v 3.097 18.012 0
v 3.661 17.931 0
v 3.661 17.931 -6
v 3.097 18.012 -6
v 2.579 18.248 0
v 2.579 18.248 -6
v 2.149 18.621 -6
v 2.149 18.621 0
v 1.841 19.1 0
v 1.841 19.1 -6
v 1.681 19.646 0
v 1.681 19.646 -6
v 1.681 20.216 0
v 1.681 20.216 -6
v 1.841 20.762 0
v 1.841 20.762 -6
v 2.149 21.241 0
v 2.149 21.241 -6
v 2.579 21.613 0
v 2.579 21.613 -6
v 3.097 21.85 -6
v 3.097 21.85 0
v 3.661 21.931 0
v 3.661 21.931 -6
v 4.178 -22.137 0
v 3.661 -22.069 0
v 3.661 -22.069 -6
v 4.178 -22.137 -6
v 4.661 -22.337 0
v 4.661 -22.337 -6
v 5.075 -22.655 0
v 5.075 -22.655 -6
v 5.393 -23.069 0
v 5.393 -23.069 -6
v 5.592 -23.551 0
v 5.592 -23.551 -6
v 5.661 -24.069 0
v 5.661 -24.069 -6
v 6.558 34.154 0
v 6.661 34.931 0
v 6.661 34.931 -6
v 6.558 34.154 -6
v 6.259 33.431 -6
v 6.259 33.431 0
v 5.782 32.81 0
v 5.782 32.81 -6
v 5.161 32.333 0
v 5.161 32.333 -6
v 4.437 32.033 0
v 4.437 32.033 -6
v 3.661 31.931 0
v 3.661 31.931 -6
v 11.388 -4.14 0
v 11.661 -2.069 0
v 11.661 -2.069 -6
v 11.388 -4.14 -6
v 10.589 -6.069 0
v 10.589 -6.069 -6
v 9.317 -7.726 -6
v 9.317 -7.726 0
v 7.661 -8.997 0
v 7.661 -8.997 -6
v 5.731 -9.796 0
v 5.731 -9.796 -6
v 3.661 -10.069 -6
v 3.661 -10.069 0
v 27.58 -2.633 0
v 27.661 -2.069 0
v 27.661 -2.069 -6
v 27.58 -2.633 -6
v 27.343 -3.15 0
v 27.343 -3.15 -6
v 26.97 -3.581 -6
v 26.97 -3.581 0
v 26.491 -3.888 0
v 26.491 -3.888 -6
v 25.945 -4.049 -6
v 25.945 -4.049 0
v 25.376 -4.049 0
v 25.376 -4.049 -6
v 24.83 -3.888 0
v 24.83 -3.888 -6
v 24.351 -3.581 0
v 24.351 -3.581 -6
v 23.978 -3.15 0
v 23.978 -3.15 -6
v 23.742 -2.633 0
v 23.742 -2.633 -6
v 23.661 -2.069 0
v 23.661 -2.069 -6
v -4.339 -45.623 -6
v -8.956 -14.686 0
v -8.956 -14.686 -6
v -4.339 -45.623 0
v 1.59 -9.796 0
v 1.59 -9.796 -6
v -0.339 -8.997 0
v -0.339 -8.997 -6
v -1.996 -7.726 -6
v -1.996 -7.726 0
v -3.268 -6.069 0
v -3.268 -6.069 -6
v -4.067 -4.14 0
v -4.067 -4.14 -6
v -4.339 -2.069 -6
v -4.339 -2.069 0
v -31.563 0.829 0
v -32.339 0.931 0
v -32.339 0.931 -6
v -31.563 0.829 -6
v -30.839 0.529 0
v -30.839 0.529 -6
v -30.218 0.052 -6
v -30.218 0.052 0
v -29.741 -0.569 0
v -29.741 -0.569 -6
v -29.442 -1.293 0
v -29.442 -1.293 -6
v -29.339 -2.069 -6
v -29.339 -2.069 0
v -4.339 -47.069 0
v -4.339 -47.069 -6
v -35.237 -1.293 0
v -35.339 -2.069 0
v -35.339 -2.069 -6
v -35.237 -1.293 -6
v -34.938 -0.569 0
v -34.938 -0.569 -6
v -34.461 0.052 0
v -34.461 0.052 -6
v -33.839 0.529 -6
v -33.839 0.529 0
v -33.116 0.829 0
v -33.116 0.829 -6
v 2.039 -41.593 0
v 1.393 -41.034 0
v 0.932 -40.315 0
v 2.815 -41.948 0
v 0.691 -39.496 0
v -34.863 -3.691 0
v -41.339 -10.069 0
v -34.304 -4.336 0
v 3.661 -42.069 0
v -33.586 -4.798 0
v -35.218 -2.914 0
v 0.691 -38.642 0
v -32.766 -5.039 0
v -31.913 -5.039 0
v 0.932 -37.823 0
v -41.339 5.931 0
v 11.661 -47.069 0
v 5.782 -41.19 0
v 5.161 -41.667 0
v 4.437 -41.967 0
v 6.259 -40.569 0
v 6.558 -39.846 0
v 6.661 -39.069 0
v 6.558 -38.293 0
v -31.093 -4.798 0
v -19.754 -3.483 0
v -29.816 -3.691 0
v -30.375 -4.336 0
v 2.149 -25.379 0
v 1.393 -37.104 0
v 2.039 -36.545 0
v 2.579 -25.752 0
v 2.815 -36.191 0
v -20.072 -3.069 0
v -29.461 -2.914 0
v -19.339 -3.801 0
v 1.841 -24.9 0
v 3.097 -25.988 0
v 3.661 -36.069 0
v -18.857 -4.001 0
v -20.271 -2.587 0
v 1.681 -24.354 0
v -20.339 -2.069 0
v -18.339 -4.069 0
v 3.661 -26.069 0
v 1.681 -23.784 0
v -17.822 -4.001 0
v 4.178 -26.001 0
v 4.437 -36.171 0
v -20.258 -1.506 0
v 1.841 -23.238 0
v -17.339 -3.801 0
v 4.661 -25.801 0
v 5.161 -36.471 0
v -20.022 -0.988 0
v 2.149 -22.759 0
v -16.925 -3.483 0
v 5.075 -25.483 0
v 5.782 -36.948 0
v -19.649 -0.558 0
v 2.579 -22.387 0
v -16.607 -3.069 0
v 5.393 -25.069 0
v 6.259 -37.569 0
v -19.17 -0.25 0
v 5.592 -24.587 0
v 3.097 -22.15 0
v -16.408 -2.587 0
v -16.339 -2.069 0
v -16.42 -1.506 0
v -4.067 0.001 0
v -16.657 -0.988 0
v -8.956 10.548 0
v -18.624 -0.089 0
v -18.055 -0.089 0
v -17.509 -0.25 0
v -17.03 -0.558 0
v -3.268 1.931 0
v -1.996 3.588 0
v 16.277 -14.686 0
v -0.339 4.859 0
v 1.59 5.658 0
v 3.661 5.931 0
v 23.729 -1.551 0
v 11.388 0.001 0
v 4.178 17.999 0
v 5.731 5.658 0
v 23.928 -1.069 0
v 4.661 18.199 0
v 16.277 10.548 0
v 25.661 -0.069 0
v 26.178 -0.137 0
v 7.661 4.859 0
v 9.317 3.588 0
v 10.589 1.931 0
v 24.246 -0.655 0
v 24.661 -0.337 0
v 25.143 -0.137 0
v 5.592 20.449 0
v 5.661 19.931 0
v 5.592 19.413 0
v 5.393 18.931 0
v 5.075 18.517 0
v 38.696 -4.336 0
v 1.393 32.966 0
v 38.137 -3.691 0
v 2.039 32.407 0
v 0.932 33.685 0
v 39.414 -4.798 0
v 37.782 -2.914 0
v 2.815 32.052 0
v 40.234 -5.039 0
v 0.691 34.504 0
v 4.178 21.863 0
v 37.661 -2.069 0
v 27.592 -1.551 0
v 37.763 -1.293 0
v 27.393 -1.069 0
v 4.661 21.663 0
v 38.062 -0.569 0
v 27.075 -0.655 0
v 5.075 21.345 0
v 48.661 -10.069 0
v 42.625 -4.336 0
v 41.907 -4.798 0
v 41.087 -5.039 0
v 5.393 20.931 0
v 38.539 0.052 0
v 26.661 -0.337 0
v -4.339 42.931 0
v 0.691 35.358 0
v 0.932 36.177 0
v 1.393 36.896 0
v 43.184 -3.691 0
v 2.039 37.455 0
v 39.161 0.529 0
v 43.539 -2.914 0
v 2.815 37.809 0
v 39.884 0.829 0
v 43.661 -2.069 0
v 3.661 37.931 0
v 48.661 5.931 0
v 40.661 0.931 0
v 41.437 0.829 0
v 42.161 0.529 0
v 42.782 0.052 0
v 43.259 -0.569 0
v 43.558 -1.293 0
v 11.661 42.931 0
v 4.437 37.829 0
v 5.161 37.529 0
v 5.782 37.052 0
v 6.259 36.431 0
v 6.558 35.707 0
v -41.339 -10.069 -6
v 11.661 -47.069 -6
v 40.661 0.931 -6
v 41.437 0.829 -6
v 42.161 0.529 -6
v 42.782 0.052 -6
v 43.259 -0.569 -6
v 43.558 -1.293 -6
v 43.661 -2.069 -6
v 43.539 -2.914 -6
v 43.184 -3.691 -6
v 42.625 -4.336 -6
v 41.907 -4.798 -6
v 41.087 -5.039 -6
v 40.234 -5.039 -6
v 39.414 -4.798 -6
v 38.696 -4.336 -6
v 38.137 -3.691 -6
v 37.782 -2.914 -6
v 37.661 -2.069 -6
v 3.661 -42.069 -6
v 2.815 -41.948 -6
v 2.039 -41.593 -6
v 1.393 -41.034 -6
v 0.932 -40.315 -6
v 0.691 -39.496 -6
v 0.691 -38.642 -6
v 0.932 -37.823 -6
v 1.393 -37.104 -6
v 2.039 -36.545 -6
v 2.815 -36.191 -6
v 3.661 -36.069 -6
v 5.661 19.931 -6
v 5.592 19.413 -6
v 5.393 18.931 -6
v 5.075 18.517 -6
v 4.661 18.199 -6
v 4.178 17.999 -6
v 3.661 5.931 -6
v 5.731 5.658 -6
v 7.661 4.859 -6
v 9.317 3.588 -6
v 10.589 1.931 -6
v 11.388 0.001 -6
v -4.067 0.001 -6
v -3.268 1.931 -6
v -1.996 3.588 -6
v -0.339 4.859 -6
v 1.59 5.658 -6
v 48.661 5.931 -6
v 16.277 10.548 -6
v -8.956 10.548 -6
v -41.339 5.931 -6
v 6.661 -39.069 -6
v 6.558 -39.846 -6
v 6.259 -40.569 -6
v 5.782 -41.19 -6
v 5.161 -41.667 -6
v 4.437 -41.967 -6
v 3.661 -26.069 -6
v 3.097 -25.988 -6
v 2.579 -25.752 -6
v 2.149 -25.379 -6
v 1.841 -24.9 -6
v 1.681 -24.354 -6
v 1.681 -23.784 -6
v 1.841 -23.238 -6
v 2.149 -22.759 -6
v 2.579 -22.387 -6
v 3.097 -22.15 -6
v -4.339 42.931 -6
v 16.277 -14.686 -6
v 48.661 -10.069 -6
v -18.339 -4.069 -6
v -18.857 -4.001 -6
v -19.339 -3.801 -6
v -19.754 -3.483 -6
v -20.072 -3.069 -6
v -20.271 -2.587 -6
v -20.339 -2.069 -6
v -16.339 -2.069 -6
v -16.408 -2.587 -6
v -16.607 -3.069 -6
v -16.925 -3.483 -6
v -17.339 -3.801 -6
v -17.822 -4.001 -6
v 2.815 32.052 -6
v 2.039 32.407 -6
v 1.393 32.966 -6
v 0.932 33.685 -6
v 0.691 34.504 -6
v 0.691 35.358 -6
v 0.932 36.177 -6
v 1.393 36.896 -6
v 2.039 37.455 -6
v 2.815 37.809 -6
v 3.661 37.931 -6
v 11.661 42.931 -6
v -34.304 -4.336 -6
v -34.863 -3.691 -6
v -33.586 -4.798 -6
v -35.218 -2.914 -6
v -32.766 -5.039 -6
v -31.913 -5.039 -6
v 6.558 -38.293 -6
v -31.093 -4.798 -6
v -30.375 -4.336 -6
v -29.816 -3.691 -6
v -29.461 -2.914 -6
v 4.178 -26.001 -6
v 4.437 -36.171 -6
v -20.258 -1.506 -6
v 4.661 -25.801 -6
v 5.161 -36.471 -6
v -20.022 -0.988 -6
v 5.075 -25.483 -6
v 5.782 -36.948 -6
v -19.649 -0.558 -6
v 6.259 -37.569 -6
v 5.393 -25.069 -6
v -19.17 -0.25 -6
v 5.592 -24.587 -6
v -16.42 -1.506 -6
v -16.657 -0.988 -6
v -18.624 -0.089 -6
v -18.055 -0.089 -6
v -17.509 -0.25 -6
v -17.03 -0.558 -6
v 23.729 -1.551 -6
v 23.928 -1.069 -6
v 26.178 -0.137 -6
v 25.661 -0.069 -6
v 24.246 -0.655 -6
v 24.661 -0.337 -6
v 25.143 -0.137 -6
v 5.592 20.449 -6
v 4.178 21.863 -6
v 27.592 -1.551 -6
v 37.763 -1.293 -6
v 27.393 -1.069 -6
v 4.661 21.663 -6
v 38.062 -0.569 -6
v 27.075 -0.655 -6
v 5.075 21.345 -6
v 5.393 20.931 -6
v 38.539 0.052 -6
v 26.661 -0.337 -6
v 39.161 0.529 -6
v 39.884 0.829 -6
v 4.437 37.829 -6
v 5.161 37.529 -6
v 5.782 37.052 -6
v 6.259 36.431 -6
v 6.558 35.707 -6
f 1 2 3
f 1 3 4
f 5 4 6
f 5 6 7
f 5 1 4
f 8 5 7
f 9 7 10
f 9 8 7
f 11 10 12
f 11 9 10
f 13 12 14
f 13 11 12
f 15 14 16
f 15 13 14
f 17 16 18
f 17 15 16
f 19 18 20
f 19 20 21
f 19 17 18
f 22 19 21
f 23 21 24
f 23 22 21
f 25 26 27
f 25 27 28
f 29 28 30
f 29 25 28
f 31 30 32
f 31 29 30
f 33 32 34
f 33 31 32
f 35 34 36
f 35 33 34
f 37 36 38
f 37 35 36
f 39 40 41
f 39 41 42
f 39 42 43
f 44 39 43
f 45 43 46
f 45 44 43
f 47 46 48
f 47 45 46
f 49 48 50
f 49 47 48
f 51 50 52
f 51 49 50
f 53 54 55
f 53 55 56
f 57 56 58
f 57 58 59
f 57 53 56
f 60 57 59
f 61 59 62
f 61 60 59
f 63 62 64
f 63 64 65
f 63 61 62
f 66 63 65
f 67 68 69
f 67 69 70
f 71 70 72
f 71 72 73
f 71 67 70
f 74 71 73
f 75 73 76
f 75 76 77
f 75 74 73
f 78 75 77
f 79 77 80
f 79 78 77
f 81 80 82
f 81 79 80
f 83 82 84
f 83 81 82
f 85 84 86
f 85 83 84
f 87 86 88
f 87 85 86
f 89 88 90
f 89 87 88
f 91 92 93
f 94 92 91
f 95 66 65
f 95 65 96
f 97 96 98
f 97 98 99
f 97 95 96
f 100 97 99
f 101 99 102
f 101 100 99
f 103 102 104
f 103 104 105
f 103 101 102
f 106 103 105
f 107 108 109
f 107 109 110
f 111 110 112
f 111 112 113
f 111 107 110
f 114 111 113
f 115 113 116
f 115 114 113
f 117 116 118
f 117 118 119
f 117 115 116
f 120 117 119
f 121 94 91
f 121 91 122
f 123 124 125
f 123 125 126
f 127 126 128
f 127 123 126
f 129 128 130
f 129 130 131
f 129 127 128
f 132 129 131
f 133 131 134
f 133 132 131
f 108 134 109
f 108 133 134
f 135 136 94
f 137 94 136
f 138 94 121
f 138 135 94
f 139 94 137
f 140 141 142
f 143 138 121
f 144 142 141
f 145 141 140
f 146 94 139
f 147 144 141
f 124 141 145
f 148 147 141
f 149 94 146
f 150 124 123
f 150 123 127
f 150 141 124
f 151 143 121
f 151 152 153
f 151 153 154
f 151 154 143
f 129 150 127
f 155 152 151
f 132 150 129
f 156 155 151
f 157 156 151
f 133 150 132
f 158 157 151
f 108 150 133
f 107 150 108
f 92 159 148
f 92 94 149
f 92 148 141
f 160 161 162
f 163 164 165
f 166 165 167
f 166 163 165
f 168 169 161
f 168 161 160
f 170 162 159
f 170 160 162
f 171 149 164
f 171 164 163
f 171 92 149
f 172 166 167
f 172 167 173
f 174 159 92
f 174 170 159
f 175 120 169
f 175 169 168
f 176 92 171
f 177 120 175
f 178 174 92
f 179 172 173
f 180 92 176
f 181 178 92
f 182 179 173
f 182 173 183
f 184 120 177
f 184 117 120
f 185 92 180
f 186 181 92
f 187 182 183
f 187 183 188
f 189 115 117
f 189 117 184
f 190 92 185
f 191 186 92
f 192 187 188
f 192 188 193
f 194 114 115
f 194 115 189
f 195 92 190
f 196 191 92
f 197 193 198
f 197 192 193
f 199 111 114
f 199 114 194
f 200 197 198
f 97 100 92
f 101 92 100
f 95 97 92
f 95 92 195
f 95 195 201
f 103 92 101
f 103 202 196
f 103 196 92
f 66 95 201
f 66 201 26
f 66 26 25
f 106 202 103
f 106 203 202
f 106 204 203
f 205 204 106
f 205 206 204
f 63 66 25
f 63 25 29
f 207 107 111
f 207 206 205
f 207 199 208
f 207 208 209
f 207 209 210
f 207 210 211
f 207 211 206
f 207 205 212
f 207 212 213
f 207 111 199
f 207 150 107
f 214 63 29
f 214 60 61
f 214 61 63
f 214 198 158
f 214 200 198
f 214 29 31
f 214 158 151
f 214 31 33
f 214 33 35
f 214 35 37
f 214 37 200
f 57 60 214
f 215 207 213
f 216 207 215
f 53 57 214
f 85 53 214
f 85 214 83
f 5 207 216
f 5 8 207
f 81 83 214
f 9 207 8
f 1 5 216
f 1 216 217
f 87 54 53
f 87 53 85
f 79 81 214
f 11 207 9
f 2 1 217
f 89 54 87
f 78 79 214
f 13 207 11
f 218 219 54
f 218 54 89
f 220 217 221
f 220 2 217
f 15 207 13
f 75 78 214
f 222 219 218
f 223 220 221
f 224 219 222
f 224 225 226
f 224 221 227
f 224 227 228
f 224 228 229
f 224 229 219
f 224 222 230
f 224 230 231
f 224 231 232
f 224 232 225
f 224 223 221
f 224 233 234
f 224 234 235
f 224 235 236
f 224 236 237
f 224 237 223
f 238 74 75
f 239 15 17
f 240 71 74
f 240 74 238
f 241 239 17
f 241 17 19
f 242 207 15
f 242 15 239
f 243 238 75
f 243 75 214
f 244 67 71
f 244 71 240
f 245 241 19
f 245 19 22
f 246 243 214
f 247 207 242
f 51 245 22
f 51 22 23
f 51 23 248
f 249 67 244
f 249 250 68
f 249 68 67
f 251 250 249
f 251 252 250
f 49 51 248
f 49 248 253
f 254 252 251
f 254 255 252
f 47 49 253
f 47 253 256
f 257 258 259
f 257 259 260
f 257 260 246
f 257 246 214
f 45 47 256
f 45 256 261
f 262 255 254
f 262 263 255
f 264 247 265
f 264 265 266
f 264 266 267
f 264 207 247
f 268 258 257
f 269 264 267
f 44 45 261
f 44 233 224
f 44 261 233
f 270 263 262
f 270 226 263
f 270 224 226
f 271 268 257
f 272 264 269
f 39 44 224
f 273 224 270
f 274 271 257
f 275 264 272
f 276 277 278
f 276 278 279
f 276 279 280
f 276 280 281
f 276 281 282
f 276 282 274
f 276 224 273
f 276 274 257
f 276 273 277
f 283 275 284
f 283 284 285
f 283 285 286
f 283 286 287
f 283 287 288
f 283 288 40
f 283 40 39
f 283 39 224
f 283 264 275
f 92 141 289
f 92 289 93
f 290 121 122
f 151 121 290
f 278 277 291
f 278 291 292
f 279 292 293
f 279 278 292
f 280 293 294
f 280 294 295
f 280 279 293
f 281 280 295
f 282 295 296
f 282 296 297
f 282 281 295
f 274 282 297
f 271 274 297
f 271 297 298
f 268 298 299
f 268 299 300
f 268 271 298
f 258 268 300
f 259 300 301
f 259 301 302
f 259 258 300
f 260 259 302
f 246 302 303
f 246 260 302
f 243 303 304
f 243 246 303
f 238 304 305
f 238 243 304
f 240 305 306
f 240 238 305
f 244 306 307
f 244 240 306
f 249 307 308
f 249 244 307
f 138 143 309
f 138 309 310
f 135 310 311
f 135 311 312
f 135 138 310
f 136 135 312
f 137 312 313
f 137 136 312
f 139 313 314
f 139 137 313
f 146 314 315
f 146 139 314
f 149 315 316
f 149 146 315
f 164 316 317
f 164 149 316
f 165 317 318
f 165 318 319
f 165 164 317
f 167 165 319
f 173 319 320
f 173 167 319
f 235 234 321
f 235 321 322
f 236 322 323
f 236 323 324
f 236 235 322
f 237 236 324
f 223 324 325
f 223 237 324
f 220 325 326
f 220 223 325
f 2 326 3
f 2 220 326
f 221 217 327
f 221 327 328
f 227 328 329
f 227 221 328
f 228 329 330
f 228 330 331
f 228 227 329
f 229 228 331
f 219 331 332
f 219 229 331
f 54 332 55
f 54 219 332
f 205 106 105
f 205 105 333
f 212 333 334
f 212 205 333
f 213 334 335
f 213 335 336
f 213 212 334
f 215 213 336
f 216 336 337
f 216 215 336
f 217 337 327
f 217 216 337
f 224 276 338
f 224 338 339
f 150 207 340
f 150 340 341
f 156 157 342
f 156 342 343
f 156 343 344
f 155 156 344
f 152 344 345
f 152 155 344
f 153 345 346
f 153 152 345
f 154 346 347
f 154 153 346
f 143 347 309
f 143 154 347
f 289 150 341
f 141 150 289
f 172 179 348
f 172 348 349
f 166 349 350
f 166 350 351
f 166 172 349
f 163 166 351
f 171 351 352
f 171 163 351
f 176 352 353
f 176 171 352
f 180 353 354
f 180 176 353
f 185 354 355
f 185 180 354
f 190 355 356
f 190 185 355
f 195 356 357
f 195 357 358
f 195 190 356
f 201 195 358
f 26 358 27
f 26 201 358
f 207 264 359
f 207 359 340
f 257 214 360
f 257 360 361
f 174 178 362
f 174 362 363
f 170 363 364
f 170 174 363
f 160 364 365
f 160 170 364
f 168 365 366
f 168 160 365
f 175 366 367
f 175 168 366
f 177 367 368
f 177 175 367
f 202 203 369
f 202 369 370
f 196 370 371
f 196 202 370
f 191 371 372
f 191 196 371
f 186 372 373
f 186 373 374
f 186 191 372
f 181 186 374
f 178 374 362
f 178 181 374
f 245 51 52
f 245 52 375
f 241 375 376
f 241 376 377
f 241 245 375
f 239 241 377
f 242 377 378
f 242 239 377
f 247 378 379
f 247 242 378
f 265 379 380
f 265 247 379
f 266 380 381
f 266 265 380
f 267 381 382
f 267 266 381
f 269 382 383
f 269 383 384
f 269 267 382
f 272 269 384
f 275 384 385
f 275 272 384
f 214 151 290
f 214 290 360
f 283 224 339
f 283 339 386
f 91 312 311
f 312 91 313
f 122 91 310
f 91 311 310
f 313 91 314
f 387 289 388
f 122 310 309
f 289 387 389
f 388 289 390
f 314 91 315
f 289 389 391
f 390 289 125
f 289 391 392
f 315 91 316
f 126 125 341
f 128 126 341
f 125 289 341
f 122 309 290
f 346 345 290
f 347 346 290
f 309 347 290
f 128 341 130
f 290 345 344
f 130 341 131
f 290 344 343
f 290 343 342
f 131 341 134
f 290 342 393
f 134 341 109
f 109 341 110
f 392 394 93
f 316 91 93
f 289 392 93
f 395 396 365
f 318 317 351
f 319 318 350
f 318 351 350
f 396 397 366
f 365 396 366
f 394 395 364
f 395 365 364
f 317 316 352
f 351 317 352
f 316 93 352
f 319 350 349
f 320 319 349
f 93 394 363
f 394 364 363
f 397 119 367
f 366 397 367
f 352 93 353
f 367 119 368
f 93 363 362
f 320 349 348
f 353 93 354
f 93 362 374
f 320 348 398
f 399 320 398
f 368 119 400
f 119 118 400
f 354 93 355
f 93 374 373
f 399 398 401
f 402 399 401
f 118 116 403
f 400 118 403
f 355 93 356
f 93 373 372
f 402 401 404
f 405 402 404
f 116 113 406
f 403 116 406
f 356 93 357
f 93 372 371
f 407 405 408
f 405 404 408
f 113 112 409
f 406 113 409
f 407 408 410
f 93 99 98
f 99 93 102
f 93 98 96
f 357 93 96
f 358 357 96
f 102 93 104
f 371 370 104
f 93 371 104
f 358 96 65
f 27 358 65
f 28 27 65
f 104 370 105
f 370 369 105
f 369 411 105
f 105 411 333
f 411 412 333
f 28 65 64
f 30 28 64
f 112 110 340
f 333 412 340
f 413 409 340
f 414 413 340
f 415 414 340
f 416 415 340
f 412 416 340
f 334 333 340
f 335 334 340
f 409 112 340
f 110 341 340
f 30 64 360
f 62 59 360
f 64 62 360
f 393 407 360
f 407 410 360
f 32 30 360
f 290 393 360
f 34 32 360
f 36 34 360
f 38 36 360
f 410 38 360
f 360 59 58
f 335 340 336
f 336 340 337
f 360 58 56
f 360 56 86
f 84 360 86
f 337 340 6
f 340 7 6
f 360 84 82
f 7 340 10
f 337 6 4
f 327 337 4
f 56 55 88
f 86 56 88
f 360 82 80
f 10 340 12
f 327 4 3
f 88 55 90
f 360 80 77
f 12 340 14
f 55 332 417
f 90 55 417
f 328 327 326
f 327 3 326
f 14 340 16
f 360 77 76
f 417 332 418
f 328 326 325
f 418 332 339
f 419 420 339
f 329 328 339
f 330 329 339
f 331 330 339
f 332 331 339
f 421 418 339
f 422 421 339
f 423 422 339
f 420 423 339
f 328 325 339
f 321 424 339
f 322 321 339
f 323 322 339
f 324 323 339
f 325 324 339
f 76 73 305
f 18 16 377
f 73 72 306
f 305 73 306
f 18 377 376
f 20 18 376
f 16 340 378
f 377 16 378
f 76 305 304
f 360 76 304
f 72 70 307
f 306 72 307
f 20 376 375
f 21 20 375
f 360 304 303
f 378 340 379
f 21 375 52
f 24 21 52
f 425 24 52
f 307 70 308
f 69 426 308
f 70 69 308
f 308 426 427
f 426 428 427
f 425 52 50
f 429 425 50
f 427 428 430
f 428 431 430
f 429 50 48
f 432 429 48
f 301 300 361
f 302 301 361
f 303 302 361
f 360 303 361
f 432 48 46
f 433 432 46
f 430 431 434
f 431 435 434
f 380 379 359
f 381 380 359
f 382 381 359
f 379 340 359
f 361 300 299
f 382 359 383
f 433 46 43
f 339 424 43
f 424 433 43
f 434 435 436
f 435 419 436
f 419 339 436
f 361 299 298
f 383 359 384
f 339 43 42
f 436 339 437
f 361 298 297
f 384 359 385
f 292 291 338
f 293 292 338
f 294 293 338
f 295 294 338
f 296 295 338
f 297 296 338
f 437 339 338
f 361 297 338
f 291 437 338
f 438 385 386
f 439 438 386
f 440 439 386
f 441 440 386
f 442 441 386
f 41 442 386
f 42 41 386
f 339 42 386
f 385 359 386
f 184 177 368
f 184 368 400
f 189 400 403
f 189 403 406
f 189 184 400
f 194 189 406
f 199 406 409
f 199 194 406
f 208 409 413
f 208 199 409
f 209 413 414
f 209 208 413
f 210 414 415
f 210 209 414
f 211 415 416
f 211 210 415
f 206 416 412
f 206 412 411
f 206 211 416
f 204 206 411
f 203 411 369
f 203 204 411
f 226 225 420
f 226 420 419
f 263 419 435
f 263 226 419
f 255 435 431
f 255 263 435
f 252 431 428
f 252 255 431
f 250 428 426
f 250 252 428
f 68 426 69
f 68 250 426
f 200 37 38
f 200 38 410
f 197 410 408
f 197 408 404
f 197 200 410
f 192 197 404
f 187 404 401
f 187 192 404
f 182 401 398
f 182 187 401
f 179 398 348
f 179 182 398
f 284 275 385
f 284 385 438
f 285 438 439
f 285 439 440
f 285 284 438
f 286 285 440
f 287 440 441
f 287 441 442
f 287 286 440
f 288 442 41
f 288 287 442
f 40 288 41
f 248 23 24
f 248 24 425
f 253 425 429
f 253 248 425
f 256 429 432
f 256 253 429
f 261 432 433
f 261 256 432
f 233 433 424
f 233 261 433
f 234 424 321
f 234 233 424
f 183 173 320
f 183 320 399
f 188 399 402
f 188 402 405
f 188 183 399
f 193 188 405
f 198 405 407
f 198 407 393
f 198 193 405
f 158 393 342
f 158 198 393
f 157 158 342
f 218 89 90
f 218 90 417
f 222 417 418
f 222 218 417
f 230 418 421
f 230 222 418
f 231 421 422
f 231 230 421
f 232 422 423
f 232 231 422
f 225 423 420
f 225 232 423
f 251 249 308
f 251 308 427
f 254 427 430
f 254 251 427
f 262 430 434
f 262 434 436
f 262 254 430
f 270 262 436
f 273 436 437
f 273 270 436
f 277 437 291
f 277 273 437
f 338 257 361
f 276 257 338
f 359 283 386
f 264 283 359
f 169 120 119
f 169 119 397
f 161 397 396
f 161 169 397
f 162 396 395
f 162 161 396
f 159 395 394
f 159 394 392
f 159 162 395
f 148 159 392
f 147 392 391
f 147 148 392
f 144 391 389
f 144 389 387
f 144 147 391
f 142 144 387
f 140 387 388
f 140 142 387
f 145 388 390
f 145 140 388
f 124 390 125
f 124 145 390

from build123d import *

# Parameters (mm, degrees)
F1_DEPTH = 6


with BuildPart() as f1:
    # F0 (on Top) → F1 (new body)
    with BuildSketch(Plane.XY):
        with BuildLine():
            Line((-4.3394552469, -10.0690543538), (-4.3394552469, -2.0690543538))
            Line((-4.3394552469, -2.0690543538), (-16.3394552469, -2.0690543538))
            ThreePointArc((-16.3394552469, -2.0690543538), (-16.9252416846, -3.4832679161), (-18.3394552469, -4.0690543538))
            ThreePointArc((-18.3394552469, -4.0690543538), (-19.7536688093, -3.4832679161), (-20.3394552469, -2.0690543538))
            Line((-20.3394552469, -2.0690543538), (-29.3394552469, -2.0690543538))
            ThreePointArc((-29.3394552469, -2.0690543538), (-32.3394552469, -5.0690543538), (-35.3394552469, -2.0690543538))
            Line((-35.3394552469, -2.0690543538), (-41.3394552469, -2.0690543538))
            Line((-41.3394552469, -2.0690543538), (-41.3394552469, -5.0690543538))
            Line((-41.3394552469, -5.0690543538), (-41.3394552469, -10.0690543538))
            Line((-41.3394552469, -10.0690543538), (-36.3394552469, -10.0690543538))
            Line((-36.3394552469, -10.0690543538), (-13.5731431865, -10.0690543538))
            Line((-13.5731431865, -10.0690543538), (-13.1868220354, -10.0690543538))
            Line((-13.1868220354, -10.0690543538), (-4.3394552469, -10.0690543538))
        make_face()
        with BuildLine():
            Line((-4.3394552469, 5.9309456462), (-4.3394552469, -2.0690543538))
            ThreePointArc((-4.3394552469, -2.0690543538), (-1.9963094964, 3.5877998957), (3.6605447531, 5.9309456462))
            Line((3.6605447531, 5.9309456462), (-4.3394552469, 5.9309456462))
        make_face()
        with BuildLine():
            ThreePointArc((3.6605447531, -10.0690543538), (-1.9963094964, -7.7259086033), (-4.3394552469, -2.0690543538))
            Line((-4.3394552469, -2.0690543538), (-4.3394552469, -10.0690543538))
            Line((-4.3394552469, -10.0690543538), (3.6605447531, -10.0690543538))
        make_face()
        with BuildLine():
            Line((-16.3394552469, -2.0690543538), (-4.3394552469, -2.0690543538))
            Line((-4.3394552469, -2.0690543538), (-4.3394552469, 5.9309456462))
            Line((-4.3394552469, 5.9309456462), (-11.6972615942, 5.9309456462))
            Line((-11.6972615942, 5.9309456462), (-13.5731431865, 5.9309456462))
            Line((-13.5731431865, 5.9309456462), (-36.3394552469, 5.9309456462))
            Line((-36.3394552469, 5.9309456462), (-41.3394552469, 5.9309456462))
            Line((-41.3394552469, 5.9309456462), (-41.3394552469, 0.9309456462))
            Line((-41.3394552469, 0.9309456462), (-41.3394552469, -2.0690543538))
            Line((-41.3394552469, -2.0690543538), (-35.3394552469, -2.0690543538))
            ThreePointArc((-35.3394552469, -2.0690543538), (-34.4607755905, 0.0522659898), (-32.3394552469, 0.9309456462))
            ThreePointArc((-32.3394552469, 0.9309456462), (-30.2181349034, 0.0522659898), (-29.3394552469, -2.0690543538))
            Line((-29.3394552469, -2.0690543538), (-20.3394552469, -2.0690543538))
            ThreePointArc((-20.3394552469, -2.0690543538), (-18.3394552469, -0.0690543538), (-16.3394552469, -2.0690543538))
        make_face()
        with BuildLine():
            Line((11.6605447531, 5.9309456462), (3.6605447531, 5.9309456462))
            ThreePointArc((3.6605447531, 5.9309456462), (9.3173990026, 3.5877998957), (11.6605447531, -2.0690543538))
            Line((11.6605447531, -2.0690543538), (11.6605447531, 5.9309456462))
        make_face()
        with BuildLine():
            Line((-4.3394552469, 5.9309456462), (3.6605447531, 5.9309456462))
            Line((3.6605447531, 5.9309456462), (3.6605447531, 17.9309456462))
            ThreePointArc((3.6605447531, 17.9309456462), (1.6605447531, 19.9309456462), (3.6605447531, 21.9309456462))
            Line((3.6605447531, 21.9309456462), (3.6605447531, 31.9309456462))
            ThreePointArc((3.6605447531, 31.9309456462), (0.6605447531, 34.9309456462), (3.6605447531, 37.9309456462))
            Line((3.6605447531, 37.9309456462), (3.6605447531, 42.9309456462))
            Line((3.6605447531, 42.9309456462), (0.6605447531, 42.9309456462))
            Line((0.6605447531, 42.9309456462), (-4.3394552469, 42.9309456462))
            Line((-4.3394552469, 42.9309456462), (-4.3394552469, 37.9309456462))
            Line((-4.3394552469, 37.9309456462), (-4.3394552469, 15.1646335859))
            Line((-4.3394552469, 15.1646335859), (-4.3394552469, 14.7783124347))
            Line((-4.3394552469, 14.7783124347), (-4.3394552469, 5.9309456462))
        make_face()
        with BuildLine():
            Line((3.6605447531, 17.9309456462), (3.6605447531, 5.9309456462))
            Line((3.6605447531, 5.9309456462), (11.6605447531, 5.9309456462))
            Line((11.6605447531, 5.9309456462), (11.6605447531, 13.2887519935))
            Line((11.6605447531, 13.2887519935), (11.6605447531, 15.1646335859))
            Line((11.6605447531, 15.1646335859), (11.6605447531, 37.9309456462))
            Line((11.6605447531, 37.9309456462), (11.6605447531, 42.9309456462))
            Line((11.6605447531, 42.9309456462), (6.6605447531, 42.9309456462))
            Line((6.6605447531, 42.9309456462), (3.6605447531, 42.9309456462))
            Line((3.6605447531, 42.9309456462), (3.6605447531, 37.9309456462))
            ThreePointArc((3.6605447531, 37.9309456462), (5.7818650966, 37.0522659898), (6.6605447531, 34.9309456462))
            ThreePointArc((6.6605447531, 34.9309456462), (5.7818650966, 32.8096253027), (3.6605447531, 31.9309456462))
            Line((3.6605447531, 31.9309456462), (3.6605447531, 21.9309456462))
            ThreePointArc((3.6605447531, 21.9309456462), (5.0747583154, 21.3451592086), (5.6605447531, 19.9309456462))
            ThreePointArc((5.6605447531, 19.9309456462), (5.0747583154, 18.5167320839), (3.6605447531, 17.9309456462))
        make_face()
        with BuildLine():
            Line((11.6605447531, -10.0690543538), (3.6605447531, -10.0690543538))
            Line((3.6605447531, -10.0690543538), (3.6605447531, -22.0690543538))
            ThreePointArc((3.6605447531, -22.0690543538), (5.0747583154, -22.6548407914), (5.6605447531, -24.0690543538))
            ThreePointArc((5.6605447531, -24.0690543538), (5.0747583154, -25.4832679161), (3.6605447531, -26.0690543538))
            Line((3.6605447531, -26.0690543538), (3.6605447531, -36.0690543538))
            ThreePointArc((3.6605447531, -36.0690543538), (5.7818650966, -36.9477340102), (6.6605447531, -39.0690543538))
            ThreePointArc((6.6605447531, -39.0690543538), (5.7818650966, -41.1903746973), (3.6605447531, -42.0690543538))
            Line((3.6605447531, -42.0690543538), (3.6605447531, -47.0690543538))
            Line((3.6605447531, -47.0690543538), (6.6605447531, -47.0690543538))
            Line((6.6605447531, -47.0690543538), (11.6605447531, -47.0690543538))
            Line((11.6605447531, -47.0690543538), (11.6605447531, -42.0690543538))
            Line((11.6605447531, -42.0690543538), (11.6605447531, -19.3027422934))
            Line((11.6605447531, -19.3027422934), (11.6605447531, -18.9164211423))
            Line((11.6605447531, -18.9164211423), (11.6605447531, -10.0690543538))
        make_face()
        with BuildLine():
            Line((3.6605447531, -22.0690543538), (3.6605447531, -10.0690543538))
            Line((3.6605447531, -10.0690543538), (-4.3394552469, -10.0690543538))
            Line((-4.3394552469, -10.0690543538), (-4.3394552469, -17.4268607011))
            Line((-4.3394552469, -17.4268607011), (-4.3394552469, -19.3027422934))
            Line((-4.3394552469, -19.3027422934), (-4.3394552469, -42.0690543538))
            Line((-4.3394552469, -42.0690543538), (-4.3394552469, -45.6229187548))
            Line((-4.3394552469, -45.6229187548), (-4.3394552469, -47.0690543538))
            Line((-4.3394552469, -47.0690543538), (0.6605447531, -47.0690543538))
            Line((0.6605447531, -47.0690543538), (3.6605447531, -47.0690543538))
            Line((3.6605447531, -47.0690543538), (3.6605447531, -42.0690543538))
            ThreePointArc((3.6605447531, -42.0690543538), (0.6605447531, -39.0690543538), (3.6605447531, -36.0690543538))
            Line((3.6605447531, -36.0690543538), (3.6605447531, -26.0690543538))
            ThreePointArc((3.6605447531, -26.0690543538), (1.6605447531, -24.0690543538), (3.6605447531, -22.0690543538))
        make_face()
        with BuildLine():
            ThreePointArc((11.6605447531, -2.0690543538), (9.3173990026, -7.7259086033), (3.6605447531, -10.0690543538))
            Line((3.6605447531, -10.0690543538), (11.6605447531, -10.0690543538))
            Line((11.6605447531, -10.0690543538), (11.6605447531, -2.0690543538))
        make_face()
        with BuildLine():
            Line((11.6605447531, 5.9309456462), (11.6605447531, -2.0690543538))
            Line((11.6605447531, -2.0690543538), (23.6605447531, -2.0690543538))
            ThreePointArc((23.6605447531, -2.0690543538), (24.2463311907, -0.6548407914), (25.6605447531, -0.0690543538))
            ThreePointArc((25.6605447531, -0.0690543538), (27.0747583154, -0.6548407914), (27.6605447531, -2.0690543538))
            Line((27.6605447531, -2.0690543538), (37.6605447531, -2.0690543538))
            ThreePointArc((37.6605447531, -2.0690543538), (38.5392244095, 0.0522659898), (40.6605447531, 0.9309456462))
            ThreePointArc((40.6605447531, 0.9309456462), (42.7818650966, 0.0522659898), (43.6605447531, -2.0690543538))
            Line((43.6605447531, -2.0690543538), (48.6605447531, -2.0690543538))
            Line((48.6605447531, -2.0690543538), (48.6605447531, 0.9309456462))
            Line((48.6605447531, 0.9309456462), (48.6605447531, 5.9309456462))
            Line((48.6605447531, 5.9309456462), (43.6605447531, 5.9309456462))
            Line((43.6605447531, 5.9309456462), (20.8942326927, 5.9309456462))
            Line((20.8942326927, 5.9309456462), (20.5079115416, 5.9309456462))
            Line((20.5079115416, 5.9309456462), (11.6605447531, 5.9309456462))
        make_face()
        with BuildLine():
            Line((23.6605447531, -2.0690543538), (11.6605447531, -2.0690543538))
            Line((11.6605447531, -2.0690543538), (11.6605447531, -10.0690543538))
            Line((11.6605447531, -10.0690543538), (19.0183511004, -10.0690543538))
            Line((19.0183511004, -10.0690543538), (20.8942326927, -10.0690543538))
            Line((20.8942326927, -10.0690543538), (43.6605447531, -10.0690543538))
            Line((43.6605447531, -10.0690543538), (48.6605447531, -10.0690543538))
            Line((48.6605447531, -10.0690543538), (48.6605447531, -5.0690543538))
            Line((48.6605447531, -5.0690543538), (48.6605447531, -2.0690543538))
            Line((48.6605447531, -2.0690543538), (43.6605447531, -2.0690543538))
            ThreePointArc((43.6605447531, -2.0690543538), (40.6605447531, -5.0690543538), (37.6605447531, -2.0690543538))
            Line((37.6605447531, -2.0690543538), (27.6605447531, -2.0690543538))
            ThreePointArc((27.6605447531, -2.0690543538), (25.6605447531, -4.0690543538), (23.6605447531, -2.0690543538))
        make_face()
        Polygon((-4.3394552469, -17.4268607011), (-4.3394552469, -10.0690543538), (-13.1868220354, -10.0690543538), (-13.5731431865, -10.0690543538), (-8.9562992167, -14.6858983236), (-4.3394552469, -19.3027422934), align=None)
        Polygon((-11.6972615942, 5.9309456462), (-4.3394552469, 5.9309456462), (-4.3394552469, 14.7783124347), (-4.3394552469, 15.1646335859), (-8.9562992167, 10.547789616), (-13.5731431865, 5.9309456462), align=None)
        Polygon((11.6605447531, 13.2887519935), (11.6605447531, 5.9309456462), (20.5079115416, 5.9309456462), (20.8942326927, 5.9309456462), (16.2773887229, 10.547789616), (11.6605447531, 15.1646335859), align=None)
        Polygon((19.0183511004, -10.0690543538), (11.6605447531, -10.0690543538), (11.6605447531, -18.9164211423), (11.6605447531, -19.3027422934), (16.2773887229, -14.6858983236), (20.8942326927, -10.0690543538), align=None)
        Polygon((-4.3394552469, -42.0690543538), (-4.3394552469, -19.3027422934), (-8.9562992167, -14.6858983236), (-4.3394552469, -45.6229187548), align=None)
        Polygon((-8.9562992167, -14.6858983236), (-13.5731431865, -10.0690543538), (-36.3394552469, -10.0690543538), (-41.3394552469, -10.0690543538), align=None)
        Polygon((-8.9562992167, 10.547789616), (-4.3394552469, 15.1646335859), (-4.3394552469, 37.9309456462), (-4.3394552469, 42.9309456462), align=None)
        Polygon((-36.3394552469, 5.9309456462), (-13.5731431865, 5.9309456462), (-8.9562992167, 10.547789616), (-41.3394552469, 5.9309456462), align=None)
        Polygon((11.6605447531, 37.9309456462), (11.6605447531, 15.1646335859), (16.2773887229, 10.547789616), (11.6605447531, 42.9309456462), align=None)
        Polygon((16.2773887229, 10.547789616), (20.8942326927, 5.9309456462), (43.6605447531, 5.9309456462), (48.6605447531, 5.9309456462), align=None)
        Polygon((16.2773887229, -14.6858983236), (11.6605447531, -19.3027422934), (11.6605447531, -42.0690543538), (11.6605447531, -47.0690543538), align=None)
        Polygon((43.6605447531, -10.0690543538), (20.8942326927, -10.0690543538), (16.2773887229, -14.6858983236), (48.6605447531, -10.0690543538), align=None)
    extrude(amount=-F1_DEPTH)


solid = f1.part
